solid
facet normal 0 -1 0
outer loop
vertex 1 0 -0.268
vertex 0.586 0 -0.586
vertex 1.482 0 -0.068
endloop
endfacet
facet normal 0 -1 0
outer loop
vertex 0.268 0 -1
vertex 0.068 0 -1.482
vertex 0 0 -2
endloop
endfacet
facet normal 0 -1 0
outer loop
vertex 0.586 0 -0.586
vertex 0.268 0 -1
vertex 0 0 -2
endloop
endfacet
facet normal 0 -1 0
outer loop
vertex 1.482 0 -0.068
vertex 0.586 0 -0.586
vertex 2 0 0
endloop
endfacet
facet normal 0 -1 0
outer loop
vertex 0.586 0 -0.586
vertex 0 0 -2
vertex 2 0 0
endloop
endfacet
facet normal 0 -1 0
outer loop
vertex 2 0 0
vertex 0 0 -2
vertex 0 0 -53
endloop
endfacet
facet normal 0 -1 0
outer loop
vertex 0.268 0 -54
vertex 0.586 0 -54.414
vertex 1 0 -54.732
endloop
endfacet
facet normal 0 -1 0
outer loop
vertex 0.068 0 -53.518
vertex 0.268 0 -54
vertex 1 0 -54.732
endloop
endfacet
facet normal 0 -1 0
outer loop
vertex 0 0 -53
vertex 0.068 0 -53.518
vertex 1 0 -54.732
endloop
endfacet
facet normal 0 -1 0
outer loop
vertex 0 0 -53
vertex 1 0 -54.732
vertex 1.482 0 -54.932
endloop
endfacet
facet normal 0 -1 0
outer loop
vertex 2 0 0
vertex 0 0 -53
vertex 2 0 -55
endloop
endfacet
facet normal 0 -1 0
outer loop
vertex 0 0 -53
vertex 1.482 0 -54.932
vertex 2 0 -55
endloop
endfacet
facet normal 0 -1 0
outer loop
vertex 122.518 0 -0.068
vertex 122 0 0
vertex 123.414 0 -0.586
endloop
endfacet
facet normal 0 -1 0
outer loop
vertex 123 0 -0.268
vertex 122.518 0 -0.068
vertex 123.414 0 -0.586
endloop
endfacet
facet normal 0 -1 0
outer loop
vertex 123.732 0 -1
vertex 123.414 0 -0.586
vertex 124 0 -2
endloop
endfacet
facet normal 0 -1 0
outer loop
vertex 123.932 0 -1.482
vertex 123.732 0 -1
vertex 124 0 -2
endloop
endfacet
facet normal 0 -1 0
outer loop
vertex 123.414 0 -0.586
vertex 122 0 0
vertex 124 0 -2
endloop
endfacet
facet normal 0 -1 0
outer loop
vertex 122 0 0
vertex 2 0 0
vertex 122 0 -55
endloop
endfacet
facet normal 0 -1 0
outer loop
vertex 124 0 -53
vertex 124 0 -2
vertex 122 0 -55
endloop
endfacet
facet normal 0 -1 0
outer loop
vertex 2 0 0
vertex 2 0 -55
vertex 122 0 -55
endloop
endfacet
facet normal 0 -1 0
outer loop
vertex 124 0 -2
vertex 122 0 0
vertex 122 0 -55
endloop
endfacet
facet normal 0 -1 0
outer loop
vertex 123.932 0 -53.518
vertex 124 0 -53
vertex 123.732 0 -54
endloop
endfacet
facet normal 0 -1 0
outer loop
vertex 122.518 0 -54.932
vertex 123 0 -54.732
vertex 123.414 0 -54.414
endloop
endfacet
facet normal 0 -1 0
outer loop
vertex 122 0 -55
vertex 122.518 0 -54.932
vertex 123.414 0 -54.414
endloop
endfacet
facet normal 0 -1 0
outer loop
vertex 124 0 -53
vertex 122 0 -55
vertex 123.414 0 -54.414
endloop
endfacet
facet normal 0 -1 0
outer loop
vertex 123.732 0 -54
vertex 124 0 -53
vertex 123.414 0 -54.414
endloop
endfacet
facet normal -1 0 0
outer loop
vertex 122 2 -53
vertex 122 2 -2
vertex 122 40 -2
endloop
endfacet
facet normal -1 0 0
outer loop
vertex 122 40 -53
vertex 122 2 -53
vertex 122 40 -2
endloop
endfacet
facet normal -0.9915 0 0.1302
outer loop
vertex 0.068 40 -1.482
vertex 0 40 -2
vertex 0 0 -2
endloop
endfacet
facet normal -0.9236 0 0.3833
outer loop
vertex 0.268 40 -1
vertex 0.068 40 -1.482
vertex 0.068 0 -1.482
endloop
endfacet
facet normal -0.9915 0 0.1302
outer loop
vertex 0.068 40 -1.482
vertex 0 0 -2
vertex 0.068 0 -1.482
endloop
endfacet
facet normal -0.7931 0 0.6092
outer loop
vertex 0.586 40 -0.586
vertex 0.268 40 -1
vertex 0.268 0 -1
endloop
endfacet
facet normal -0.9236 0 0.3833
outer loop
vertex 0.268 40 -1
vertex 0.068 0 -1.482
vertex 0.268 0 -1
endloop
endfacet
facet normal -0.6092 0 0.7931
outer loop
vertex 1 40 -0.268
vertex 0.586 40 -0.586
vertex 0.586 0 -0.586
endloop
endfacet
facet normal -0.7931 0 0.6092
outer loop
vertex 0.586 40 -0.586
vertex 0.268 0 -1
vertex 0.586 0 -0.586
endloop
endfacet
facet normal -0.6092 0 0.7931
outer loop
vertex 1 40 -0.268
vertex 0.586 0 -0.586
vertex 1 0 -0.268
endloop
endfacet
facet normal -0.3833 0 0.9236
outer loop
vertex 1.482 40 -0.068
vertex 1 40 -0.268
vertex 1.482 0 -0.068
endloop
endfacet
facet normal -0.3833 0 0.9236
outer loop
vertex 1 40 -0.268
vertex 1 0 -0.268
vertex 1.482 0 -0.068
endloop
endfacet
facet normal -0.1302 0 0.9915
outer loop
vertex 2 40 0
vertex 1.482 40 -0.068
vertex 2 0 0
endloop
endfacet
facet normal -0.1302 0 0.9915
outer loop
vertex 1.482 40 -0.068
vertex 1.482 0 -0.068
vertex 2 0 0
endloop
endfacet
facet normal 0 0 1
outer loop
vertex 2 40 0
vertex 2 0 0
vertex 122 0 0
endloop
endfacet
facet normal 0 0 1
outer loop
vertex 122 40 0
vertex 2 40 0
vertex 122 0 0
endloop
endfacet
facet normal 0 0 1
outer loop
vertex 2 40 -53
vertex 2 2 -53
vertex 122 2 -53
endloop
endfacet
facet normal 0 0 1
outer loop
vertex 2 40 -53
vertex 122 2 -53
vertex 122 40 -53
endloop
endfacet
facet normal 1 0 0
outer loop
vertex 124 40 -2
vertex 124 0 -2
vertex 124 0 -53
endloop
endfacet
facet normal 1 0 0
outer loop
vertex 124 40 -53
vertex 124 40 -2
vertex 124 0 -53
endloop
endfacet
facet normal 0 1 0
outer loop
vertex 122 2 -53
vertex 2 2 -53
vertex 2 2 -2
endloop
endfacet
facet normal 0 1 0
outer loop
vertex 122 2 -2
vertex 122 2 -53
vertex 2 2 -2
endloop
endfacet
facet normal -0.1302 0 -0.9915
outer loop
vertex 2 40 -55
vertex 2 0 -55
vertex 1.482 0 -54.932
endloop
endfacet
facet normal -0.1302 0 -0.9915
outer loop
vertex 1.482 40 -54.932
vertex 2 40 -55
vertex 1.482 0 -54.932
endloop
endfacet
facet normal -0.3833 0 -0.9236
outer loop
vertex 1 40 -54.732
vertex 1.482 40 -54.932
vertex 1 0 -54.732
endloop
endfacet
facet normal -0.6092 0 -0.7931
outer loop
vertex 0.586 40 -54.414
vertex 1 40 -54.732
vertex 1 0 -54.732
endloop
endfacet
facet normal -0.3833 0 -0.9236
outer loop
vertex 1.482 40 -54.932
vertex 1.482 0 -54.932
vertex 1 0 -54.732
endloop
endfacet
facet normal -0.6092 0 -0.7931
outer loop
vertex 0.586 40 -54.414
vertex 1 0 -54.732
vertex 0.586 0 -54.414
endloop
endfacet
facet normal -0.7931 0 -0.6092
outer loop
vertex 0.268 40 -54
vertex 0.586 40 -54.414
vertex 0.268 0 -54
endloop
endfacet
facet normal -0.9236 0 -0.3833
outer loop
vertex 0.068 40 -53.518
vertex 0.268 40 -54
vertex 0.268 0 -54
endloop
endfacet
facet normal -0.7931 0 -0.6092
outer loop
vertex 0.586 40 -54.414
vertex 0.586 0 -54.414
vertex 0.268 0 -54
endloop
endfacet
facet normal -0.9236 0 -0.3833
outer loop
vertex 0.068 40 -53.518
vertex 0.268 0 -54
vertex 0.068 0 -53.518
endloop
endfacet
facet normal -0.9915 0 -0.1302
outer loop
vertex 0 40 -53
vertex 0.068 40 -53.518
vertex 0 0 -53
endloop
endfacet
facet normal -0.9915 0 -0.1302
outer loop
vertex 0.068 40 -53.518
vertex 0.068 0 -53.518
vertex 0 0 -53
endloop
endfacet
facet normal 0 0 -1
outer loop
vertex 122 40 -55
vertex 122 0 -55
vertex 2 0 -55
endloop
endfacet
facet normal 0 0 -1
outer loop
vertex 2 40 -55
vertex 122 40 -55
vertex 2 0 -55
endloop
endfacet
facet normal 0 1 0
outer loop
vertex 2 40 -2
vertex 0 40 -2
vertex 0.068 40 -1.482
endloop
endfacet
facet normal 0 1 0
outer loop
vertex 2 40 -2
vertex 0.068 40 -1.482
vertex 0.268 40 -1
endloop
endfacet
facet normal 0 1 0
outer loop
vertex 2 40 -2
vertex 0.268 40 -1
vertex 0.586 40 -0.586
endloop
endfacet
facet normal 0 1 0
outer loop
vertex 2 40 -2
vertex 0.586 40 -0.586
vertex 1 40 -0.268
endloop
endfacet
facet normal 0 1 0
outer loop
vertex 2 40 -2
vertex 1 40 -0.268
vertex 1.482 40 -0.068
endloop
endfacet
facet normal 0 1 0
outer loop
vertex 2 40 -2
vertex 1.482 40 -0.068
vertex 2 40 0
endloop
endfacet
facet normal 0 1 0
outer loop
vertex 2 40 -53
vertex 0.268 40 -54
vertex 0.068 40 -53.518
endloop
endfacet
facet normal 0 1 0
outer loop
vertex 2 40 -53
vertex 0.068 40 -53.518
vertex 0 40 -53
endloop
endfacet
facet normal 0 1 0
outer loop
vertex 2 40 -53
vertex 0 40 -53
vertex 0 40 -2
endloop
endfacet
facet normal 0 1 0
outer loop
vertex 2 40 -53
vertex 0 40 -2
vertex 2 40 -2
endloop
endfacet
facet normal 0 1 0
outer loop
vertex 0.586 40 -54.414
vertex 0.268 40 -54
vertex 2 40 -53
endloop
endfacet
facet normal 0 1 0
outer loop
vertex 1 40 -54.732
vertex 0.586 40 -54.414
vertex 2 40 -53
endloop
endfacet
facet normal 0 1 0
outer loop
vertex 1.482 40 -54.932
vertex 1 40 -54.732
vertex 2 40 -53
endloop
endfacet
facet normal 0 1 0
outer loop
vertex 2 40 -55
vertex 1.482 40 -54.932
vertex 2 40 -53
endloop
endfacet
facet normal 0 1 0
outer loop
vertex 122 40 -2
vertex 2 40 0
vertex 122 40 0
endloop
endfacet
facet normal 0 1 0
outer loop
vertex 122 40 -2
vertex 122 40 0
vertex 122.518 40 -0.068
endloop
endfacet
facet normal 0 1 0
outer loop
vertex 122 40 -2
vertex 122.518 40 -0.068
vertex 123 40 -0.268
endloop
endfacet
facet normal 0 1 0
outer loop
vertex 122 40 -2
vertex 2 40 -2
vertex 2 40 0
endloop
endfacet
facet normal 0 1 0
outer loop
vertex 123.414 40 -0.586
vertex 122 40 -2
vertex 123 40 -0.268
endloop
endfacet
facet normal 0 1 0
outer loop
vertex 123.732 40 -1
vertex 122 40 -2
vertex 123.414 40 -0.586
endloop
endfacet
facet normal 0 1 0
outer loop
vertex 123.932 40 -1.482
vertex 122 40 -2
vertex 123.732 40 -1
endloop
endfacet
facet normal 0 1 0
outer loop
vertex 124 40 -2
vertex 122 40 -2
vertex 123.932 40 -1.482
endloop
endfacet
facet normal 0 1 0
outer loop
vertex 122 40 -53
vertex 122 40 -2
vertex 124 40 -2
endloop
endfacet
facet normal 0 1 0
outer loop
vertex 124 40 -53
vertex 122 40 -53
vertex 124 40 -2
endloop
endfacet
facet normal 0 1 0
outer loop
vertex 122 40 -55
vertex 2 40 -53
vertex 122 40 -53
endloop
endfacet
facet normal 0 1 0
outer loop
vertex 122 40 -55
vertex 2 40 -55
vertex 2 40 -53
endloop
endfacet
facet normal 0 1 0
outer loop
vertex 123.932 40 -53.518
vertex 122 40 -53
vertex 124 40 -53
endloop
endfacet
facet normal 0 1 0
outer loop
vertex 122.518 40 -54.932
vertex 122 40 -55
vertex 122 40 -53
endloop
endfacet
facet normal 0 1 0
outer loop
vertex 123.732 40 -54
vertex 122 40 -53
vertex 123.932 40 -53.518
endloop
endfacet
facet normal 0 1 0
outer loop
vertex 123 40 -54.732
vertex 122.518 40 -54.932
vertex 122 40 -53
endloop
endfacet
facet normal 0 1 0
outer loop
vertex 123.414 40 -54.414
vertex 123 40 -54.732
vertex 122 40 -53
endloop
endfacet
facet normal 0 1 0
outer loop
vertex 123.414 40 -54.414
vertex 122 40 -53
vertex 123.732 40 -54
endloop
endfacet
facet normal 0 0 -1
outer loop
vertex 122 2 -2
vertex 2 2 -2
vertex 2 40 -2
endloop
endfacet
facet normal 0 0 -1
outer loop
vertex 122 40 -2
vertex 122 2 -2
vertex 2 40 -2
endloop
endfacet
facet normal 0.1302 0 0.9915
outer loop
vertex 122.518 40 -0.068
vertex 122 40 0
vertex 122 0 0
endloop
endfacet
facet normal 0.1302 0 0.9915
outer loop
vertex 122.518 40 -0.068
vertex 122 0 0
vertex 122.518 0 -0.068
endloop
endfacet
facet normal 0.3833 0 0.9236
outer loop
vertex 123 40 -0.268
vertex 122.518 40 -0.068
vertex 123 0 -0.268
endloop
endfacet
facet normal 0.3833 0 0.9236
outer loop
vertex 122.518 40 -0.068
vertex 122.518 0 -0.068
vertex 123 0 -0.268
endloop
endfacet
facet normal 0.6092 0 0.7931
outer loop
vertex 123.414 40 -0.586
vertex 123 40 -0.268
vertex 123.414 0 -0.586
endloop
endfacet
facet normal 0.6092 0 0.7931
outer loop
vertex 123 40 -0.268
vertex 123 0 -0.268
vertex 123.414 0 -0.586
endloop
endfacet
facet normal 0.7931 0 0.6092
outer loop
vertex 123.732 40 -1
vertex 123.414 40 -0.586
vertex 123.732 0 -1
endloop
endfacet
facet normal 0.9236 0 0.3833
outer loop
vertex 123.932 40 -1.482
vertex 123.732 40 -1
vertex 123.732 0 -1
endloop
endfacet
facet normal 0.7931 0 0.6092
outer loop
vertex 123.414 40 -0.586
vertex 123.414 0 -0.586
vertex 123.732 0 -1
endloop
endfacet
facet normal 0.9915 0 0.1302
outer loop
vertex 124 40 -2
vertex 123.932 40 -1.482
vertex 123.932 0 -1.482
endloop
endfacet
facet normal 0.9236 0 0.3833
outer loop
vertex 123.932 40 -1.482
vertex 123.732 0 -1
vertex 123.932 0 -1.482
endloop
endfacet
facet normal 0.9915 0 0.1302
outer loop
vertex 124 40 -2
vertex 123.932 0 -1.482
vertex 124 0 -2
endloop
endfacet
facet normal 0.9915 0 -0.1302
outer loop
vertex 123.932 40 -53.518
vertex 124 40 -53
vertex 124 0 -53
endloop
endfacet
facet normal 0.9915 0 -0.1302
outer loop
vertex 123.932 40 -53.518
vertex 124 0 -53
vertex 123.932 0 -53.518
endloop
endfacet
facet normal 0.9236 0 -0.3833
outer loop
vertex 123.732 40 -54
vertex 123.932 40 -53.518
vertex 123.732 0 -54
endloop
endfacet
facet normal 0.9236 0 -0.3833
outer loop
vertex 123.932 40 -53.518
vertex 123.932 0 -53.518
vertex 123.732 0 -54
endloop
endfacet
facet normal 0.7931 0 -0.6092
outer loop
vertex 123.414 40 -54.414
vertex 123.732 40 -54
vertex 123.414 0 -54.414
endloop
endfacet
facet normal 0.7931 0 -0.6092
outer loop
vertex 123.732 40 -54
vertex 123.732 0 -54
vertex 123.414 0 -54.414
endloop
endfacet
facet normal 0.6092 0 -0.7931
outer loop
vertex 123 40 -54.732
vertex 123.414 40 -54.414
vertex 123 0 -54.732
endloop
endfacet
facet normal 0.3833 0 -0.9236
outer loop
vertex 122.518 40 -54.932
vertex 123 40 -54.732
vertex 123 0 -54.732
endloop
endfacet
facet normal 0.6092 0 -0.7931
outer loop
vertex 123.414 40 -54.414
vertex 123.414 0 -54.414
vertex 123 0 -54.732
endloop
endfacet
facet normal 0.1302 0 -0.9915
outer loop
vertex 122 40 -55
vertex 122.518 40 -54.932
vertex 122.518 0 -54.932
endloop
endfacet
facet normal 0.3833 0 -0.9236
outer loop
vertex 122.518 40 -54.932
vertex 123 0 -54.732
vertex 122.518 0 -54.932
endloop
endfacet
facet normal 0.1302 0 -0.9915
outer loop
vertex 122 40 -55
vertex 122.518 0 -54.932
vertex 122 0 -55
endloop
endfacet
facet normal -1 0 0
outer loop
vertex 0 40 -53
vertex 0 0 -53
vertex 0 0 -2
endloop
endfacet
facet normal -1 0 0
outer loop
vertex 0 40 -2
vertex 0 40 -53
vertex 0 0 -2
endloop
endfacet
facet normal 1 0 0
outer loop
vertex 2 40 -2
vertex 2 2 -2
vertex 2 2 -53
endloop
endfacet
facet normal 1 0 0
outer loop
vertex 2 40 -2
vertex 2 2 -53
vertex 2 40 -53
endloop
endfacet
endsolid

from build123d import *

# Parameters (mm, degrees)
BOSS_EXTRUDE1_DEPTH = 40
SHELL1_START        = 2
SHELL1_OUTLINE_W    = 38
SHELL1_OUTLINE_H    = 51
SHELL1_DEPTH        = 120


# Read off the part's stored shape, not the designer's step: Shell1
with BuildPart() as part:
    # Sketch1 → Boss-Extrude1 (new body)
    with BuildSketch(Plane(origin=(0, 0, 0), x_dir=(1, 0, 0), z_dir=(0, 1, 0))):
        with BuildLine():
            Line((2, 0), (122, 0))
            ThreePointArc((122, 0), (123.414213562, 0.585786438), (124, 2))
            Line((124, 2), (124, 53))
            ThreePointArc((124, 53), (123.414213562, 54.414213562), (122, 55))
            Line((122, 55), (2, 55))
            ThreePointArc((2, 55), (0.585786438, 54.414213562), (0, 53))
            Line((0, 53), (0, 2))
            ThreePointArc((0, 2), (0.585786438, 0.585786438), (2, 0))
        make_face()
    extrude(amount=BOSS_EXTRUDE1_DEPTH)

    # Shell1 outline → Shell1 (cut)
    with BuildSketch(Plane.YZ.offset(SHELL1_START)):
        with Locations((21, -27.5)):
            Rectangle(SHELL1_OUTLINE_W, SHELL1_OUTLINE_H)
    extrude(amount=SHELL1_DEPTH, mode=Mode.SUBTRACT)


solid = part.part
